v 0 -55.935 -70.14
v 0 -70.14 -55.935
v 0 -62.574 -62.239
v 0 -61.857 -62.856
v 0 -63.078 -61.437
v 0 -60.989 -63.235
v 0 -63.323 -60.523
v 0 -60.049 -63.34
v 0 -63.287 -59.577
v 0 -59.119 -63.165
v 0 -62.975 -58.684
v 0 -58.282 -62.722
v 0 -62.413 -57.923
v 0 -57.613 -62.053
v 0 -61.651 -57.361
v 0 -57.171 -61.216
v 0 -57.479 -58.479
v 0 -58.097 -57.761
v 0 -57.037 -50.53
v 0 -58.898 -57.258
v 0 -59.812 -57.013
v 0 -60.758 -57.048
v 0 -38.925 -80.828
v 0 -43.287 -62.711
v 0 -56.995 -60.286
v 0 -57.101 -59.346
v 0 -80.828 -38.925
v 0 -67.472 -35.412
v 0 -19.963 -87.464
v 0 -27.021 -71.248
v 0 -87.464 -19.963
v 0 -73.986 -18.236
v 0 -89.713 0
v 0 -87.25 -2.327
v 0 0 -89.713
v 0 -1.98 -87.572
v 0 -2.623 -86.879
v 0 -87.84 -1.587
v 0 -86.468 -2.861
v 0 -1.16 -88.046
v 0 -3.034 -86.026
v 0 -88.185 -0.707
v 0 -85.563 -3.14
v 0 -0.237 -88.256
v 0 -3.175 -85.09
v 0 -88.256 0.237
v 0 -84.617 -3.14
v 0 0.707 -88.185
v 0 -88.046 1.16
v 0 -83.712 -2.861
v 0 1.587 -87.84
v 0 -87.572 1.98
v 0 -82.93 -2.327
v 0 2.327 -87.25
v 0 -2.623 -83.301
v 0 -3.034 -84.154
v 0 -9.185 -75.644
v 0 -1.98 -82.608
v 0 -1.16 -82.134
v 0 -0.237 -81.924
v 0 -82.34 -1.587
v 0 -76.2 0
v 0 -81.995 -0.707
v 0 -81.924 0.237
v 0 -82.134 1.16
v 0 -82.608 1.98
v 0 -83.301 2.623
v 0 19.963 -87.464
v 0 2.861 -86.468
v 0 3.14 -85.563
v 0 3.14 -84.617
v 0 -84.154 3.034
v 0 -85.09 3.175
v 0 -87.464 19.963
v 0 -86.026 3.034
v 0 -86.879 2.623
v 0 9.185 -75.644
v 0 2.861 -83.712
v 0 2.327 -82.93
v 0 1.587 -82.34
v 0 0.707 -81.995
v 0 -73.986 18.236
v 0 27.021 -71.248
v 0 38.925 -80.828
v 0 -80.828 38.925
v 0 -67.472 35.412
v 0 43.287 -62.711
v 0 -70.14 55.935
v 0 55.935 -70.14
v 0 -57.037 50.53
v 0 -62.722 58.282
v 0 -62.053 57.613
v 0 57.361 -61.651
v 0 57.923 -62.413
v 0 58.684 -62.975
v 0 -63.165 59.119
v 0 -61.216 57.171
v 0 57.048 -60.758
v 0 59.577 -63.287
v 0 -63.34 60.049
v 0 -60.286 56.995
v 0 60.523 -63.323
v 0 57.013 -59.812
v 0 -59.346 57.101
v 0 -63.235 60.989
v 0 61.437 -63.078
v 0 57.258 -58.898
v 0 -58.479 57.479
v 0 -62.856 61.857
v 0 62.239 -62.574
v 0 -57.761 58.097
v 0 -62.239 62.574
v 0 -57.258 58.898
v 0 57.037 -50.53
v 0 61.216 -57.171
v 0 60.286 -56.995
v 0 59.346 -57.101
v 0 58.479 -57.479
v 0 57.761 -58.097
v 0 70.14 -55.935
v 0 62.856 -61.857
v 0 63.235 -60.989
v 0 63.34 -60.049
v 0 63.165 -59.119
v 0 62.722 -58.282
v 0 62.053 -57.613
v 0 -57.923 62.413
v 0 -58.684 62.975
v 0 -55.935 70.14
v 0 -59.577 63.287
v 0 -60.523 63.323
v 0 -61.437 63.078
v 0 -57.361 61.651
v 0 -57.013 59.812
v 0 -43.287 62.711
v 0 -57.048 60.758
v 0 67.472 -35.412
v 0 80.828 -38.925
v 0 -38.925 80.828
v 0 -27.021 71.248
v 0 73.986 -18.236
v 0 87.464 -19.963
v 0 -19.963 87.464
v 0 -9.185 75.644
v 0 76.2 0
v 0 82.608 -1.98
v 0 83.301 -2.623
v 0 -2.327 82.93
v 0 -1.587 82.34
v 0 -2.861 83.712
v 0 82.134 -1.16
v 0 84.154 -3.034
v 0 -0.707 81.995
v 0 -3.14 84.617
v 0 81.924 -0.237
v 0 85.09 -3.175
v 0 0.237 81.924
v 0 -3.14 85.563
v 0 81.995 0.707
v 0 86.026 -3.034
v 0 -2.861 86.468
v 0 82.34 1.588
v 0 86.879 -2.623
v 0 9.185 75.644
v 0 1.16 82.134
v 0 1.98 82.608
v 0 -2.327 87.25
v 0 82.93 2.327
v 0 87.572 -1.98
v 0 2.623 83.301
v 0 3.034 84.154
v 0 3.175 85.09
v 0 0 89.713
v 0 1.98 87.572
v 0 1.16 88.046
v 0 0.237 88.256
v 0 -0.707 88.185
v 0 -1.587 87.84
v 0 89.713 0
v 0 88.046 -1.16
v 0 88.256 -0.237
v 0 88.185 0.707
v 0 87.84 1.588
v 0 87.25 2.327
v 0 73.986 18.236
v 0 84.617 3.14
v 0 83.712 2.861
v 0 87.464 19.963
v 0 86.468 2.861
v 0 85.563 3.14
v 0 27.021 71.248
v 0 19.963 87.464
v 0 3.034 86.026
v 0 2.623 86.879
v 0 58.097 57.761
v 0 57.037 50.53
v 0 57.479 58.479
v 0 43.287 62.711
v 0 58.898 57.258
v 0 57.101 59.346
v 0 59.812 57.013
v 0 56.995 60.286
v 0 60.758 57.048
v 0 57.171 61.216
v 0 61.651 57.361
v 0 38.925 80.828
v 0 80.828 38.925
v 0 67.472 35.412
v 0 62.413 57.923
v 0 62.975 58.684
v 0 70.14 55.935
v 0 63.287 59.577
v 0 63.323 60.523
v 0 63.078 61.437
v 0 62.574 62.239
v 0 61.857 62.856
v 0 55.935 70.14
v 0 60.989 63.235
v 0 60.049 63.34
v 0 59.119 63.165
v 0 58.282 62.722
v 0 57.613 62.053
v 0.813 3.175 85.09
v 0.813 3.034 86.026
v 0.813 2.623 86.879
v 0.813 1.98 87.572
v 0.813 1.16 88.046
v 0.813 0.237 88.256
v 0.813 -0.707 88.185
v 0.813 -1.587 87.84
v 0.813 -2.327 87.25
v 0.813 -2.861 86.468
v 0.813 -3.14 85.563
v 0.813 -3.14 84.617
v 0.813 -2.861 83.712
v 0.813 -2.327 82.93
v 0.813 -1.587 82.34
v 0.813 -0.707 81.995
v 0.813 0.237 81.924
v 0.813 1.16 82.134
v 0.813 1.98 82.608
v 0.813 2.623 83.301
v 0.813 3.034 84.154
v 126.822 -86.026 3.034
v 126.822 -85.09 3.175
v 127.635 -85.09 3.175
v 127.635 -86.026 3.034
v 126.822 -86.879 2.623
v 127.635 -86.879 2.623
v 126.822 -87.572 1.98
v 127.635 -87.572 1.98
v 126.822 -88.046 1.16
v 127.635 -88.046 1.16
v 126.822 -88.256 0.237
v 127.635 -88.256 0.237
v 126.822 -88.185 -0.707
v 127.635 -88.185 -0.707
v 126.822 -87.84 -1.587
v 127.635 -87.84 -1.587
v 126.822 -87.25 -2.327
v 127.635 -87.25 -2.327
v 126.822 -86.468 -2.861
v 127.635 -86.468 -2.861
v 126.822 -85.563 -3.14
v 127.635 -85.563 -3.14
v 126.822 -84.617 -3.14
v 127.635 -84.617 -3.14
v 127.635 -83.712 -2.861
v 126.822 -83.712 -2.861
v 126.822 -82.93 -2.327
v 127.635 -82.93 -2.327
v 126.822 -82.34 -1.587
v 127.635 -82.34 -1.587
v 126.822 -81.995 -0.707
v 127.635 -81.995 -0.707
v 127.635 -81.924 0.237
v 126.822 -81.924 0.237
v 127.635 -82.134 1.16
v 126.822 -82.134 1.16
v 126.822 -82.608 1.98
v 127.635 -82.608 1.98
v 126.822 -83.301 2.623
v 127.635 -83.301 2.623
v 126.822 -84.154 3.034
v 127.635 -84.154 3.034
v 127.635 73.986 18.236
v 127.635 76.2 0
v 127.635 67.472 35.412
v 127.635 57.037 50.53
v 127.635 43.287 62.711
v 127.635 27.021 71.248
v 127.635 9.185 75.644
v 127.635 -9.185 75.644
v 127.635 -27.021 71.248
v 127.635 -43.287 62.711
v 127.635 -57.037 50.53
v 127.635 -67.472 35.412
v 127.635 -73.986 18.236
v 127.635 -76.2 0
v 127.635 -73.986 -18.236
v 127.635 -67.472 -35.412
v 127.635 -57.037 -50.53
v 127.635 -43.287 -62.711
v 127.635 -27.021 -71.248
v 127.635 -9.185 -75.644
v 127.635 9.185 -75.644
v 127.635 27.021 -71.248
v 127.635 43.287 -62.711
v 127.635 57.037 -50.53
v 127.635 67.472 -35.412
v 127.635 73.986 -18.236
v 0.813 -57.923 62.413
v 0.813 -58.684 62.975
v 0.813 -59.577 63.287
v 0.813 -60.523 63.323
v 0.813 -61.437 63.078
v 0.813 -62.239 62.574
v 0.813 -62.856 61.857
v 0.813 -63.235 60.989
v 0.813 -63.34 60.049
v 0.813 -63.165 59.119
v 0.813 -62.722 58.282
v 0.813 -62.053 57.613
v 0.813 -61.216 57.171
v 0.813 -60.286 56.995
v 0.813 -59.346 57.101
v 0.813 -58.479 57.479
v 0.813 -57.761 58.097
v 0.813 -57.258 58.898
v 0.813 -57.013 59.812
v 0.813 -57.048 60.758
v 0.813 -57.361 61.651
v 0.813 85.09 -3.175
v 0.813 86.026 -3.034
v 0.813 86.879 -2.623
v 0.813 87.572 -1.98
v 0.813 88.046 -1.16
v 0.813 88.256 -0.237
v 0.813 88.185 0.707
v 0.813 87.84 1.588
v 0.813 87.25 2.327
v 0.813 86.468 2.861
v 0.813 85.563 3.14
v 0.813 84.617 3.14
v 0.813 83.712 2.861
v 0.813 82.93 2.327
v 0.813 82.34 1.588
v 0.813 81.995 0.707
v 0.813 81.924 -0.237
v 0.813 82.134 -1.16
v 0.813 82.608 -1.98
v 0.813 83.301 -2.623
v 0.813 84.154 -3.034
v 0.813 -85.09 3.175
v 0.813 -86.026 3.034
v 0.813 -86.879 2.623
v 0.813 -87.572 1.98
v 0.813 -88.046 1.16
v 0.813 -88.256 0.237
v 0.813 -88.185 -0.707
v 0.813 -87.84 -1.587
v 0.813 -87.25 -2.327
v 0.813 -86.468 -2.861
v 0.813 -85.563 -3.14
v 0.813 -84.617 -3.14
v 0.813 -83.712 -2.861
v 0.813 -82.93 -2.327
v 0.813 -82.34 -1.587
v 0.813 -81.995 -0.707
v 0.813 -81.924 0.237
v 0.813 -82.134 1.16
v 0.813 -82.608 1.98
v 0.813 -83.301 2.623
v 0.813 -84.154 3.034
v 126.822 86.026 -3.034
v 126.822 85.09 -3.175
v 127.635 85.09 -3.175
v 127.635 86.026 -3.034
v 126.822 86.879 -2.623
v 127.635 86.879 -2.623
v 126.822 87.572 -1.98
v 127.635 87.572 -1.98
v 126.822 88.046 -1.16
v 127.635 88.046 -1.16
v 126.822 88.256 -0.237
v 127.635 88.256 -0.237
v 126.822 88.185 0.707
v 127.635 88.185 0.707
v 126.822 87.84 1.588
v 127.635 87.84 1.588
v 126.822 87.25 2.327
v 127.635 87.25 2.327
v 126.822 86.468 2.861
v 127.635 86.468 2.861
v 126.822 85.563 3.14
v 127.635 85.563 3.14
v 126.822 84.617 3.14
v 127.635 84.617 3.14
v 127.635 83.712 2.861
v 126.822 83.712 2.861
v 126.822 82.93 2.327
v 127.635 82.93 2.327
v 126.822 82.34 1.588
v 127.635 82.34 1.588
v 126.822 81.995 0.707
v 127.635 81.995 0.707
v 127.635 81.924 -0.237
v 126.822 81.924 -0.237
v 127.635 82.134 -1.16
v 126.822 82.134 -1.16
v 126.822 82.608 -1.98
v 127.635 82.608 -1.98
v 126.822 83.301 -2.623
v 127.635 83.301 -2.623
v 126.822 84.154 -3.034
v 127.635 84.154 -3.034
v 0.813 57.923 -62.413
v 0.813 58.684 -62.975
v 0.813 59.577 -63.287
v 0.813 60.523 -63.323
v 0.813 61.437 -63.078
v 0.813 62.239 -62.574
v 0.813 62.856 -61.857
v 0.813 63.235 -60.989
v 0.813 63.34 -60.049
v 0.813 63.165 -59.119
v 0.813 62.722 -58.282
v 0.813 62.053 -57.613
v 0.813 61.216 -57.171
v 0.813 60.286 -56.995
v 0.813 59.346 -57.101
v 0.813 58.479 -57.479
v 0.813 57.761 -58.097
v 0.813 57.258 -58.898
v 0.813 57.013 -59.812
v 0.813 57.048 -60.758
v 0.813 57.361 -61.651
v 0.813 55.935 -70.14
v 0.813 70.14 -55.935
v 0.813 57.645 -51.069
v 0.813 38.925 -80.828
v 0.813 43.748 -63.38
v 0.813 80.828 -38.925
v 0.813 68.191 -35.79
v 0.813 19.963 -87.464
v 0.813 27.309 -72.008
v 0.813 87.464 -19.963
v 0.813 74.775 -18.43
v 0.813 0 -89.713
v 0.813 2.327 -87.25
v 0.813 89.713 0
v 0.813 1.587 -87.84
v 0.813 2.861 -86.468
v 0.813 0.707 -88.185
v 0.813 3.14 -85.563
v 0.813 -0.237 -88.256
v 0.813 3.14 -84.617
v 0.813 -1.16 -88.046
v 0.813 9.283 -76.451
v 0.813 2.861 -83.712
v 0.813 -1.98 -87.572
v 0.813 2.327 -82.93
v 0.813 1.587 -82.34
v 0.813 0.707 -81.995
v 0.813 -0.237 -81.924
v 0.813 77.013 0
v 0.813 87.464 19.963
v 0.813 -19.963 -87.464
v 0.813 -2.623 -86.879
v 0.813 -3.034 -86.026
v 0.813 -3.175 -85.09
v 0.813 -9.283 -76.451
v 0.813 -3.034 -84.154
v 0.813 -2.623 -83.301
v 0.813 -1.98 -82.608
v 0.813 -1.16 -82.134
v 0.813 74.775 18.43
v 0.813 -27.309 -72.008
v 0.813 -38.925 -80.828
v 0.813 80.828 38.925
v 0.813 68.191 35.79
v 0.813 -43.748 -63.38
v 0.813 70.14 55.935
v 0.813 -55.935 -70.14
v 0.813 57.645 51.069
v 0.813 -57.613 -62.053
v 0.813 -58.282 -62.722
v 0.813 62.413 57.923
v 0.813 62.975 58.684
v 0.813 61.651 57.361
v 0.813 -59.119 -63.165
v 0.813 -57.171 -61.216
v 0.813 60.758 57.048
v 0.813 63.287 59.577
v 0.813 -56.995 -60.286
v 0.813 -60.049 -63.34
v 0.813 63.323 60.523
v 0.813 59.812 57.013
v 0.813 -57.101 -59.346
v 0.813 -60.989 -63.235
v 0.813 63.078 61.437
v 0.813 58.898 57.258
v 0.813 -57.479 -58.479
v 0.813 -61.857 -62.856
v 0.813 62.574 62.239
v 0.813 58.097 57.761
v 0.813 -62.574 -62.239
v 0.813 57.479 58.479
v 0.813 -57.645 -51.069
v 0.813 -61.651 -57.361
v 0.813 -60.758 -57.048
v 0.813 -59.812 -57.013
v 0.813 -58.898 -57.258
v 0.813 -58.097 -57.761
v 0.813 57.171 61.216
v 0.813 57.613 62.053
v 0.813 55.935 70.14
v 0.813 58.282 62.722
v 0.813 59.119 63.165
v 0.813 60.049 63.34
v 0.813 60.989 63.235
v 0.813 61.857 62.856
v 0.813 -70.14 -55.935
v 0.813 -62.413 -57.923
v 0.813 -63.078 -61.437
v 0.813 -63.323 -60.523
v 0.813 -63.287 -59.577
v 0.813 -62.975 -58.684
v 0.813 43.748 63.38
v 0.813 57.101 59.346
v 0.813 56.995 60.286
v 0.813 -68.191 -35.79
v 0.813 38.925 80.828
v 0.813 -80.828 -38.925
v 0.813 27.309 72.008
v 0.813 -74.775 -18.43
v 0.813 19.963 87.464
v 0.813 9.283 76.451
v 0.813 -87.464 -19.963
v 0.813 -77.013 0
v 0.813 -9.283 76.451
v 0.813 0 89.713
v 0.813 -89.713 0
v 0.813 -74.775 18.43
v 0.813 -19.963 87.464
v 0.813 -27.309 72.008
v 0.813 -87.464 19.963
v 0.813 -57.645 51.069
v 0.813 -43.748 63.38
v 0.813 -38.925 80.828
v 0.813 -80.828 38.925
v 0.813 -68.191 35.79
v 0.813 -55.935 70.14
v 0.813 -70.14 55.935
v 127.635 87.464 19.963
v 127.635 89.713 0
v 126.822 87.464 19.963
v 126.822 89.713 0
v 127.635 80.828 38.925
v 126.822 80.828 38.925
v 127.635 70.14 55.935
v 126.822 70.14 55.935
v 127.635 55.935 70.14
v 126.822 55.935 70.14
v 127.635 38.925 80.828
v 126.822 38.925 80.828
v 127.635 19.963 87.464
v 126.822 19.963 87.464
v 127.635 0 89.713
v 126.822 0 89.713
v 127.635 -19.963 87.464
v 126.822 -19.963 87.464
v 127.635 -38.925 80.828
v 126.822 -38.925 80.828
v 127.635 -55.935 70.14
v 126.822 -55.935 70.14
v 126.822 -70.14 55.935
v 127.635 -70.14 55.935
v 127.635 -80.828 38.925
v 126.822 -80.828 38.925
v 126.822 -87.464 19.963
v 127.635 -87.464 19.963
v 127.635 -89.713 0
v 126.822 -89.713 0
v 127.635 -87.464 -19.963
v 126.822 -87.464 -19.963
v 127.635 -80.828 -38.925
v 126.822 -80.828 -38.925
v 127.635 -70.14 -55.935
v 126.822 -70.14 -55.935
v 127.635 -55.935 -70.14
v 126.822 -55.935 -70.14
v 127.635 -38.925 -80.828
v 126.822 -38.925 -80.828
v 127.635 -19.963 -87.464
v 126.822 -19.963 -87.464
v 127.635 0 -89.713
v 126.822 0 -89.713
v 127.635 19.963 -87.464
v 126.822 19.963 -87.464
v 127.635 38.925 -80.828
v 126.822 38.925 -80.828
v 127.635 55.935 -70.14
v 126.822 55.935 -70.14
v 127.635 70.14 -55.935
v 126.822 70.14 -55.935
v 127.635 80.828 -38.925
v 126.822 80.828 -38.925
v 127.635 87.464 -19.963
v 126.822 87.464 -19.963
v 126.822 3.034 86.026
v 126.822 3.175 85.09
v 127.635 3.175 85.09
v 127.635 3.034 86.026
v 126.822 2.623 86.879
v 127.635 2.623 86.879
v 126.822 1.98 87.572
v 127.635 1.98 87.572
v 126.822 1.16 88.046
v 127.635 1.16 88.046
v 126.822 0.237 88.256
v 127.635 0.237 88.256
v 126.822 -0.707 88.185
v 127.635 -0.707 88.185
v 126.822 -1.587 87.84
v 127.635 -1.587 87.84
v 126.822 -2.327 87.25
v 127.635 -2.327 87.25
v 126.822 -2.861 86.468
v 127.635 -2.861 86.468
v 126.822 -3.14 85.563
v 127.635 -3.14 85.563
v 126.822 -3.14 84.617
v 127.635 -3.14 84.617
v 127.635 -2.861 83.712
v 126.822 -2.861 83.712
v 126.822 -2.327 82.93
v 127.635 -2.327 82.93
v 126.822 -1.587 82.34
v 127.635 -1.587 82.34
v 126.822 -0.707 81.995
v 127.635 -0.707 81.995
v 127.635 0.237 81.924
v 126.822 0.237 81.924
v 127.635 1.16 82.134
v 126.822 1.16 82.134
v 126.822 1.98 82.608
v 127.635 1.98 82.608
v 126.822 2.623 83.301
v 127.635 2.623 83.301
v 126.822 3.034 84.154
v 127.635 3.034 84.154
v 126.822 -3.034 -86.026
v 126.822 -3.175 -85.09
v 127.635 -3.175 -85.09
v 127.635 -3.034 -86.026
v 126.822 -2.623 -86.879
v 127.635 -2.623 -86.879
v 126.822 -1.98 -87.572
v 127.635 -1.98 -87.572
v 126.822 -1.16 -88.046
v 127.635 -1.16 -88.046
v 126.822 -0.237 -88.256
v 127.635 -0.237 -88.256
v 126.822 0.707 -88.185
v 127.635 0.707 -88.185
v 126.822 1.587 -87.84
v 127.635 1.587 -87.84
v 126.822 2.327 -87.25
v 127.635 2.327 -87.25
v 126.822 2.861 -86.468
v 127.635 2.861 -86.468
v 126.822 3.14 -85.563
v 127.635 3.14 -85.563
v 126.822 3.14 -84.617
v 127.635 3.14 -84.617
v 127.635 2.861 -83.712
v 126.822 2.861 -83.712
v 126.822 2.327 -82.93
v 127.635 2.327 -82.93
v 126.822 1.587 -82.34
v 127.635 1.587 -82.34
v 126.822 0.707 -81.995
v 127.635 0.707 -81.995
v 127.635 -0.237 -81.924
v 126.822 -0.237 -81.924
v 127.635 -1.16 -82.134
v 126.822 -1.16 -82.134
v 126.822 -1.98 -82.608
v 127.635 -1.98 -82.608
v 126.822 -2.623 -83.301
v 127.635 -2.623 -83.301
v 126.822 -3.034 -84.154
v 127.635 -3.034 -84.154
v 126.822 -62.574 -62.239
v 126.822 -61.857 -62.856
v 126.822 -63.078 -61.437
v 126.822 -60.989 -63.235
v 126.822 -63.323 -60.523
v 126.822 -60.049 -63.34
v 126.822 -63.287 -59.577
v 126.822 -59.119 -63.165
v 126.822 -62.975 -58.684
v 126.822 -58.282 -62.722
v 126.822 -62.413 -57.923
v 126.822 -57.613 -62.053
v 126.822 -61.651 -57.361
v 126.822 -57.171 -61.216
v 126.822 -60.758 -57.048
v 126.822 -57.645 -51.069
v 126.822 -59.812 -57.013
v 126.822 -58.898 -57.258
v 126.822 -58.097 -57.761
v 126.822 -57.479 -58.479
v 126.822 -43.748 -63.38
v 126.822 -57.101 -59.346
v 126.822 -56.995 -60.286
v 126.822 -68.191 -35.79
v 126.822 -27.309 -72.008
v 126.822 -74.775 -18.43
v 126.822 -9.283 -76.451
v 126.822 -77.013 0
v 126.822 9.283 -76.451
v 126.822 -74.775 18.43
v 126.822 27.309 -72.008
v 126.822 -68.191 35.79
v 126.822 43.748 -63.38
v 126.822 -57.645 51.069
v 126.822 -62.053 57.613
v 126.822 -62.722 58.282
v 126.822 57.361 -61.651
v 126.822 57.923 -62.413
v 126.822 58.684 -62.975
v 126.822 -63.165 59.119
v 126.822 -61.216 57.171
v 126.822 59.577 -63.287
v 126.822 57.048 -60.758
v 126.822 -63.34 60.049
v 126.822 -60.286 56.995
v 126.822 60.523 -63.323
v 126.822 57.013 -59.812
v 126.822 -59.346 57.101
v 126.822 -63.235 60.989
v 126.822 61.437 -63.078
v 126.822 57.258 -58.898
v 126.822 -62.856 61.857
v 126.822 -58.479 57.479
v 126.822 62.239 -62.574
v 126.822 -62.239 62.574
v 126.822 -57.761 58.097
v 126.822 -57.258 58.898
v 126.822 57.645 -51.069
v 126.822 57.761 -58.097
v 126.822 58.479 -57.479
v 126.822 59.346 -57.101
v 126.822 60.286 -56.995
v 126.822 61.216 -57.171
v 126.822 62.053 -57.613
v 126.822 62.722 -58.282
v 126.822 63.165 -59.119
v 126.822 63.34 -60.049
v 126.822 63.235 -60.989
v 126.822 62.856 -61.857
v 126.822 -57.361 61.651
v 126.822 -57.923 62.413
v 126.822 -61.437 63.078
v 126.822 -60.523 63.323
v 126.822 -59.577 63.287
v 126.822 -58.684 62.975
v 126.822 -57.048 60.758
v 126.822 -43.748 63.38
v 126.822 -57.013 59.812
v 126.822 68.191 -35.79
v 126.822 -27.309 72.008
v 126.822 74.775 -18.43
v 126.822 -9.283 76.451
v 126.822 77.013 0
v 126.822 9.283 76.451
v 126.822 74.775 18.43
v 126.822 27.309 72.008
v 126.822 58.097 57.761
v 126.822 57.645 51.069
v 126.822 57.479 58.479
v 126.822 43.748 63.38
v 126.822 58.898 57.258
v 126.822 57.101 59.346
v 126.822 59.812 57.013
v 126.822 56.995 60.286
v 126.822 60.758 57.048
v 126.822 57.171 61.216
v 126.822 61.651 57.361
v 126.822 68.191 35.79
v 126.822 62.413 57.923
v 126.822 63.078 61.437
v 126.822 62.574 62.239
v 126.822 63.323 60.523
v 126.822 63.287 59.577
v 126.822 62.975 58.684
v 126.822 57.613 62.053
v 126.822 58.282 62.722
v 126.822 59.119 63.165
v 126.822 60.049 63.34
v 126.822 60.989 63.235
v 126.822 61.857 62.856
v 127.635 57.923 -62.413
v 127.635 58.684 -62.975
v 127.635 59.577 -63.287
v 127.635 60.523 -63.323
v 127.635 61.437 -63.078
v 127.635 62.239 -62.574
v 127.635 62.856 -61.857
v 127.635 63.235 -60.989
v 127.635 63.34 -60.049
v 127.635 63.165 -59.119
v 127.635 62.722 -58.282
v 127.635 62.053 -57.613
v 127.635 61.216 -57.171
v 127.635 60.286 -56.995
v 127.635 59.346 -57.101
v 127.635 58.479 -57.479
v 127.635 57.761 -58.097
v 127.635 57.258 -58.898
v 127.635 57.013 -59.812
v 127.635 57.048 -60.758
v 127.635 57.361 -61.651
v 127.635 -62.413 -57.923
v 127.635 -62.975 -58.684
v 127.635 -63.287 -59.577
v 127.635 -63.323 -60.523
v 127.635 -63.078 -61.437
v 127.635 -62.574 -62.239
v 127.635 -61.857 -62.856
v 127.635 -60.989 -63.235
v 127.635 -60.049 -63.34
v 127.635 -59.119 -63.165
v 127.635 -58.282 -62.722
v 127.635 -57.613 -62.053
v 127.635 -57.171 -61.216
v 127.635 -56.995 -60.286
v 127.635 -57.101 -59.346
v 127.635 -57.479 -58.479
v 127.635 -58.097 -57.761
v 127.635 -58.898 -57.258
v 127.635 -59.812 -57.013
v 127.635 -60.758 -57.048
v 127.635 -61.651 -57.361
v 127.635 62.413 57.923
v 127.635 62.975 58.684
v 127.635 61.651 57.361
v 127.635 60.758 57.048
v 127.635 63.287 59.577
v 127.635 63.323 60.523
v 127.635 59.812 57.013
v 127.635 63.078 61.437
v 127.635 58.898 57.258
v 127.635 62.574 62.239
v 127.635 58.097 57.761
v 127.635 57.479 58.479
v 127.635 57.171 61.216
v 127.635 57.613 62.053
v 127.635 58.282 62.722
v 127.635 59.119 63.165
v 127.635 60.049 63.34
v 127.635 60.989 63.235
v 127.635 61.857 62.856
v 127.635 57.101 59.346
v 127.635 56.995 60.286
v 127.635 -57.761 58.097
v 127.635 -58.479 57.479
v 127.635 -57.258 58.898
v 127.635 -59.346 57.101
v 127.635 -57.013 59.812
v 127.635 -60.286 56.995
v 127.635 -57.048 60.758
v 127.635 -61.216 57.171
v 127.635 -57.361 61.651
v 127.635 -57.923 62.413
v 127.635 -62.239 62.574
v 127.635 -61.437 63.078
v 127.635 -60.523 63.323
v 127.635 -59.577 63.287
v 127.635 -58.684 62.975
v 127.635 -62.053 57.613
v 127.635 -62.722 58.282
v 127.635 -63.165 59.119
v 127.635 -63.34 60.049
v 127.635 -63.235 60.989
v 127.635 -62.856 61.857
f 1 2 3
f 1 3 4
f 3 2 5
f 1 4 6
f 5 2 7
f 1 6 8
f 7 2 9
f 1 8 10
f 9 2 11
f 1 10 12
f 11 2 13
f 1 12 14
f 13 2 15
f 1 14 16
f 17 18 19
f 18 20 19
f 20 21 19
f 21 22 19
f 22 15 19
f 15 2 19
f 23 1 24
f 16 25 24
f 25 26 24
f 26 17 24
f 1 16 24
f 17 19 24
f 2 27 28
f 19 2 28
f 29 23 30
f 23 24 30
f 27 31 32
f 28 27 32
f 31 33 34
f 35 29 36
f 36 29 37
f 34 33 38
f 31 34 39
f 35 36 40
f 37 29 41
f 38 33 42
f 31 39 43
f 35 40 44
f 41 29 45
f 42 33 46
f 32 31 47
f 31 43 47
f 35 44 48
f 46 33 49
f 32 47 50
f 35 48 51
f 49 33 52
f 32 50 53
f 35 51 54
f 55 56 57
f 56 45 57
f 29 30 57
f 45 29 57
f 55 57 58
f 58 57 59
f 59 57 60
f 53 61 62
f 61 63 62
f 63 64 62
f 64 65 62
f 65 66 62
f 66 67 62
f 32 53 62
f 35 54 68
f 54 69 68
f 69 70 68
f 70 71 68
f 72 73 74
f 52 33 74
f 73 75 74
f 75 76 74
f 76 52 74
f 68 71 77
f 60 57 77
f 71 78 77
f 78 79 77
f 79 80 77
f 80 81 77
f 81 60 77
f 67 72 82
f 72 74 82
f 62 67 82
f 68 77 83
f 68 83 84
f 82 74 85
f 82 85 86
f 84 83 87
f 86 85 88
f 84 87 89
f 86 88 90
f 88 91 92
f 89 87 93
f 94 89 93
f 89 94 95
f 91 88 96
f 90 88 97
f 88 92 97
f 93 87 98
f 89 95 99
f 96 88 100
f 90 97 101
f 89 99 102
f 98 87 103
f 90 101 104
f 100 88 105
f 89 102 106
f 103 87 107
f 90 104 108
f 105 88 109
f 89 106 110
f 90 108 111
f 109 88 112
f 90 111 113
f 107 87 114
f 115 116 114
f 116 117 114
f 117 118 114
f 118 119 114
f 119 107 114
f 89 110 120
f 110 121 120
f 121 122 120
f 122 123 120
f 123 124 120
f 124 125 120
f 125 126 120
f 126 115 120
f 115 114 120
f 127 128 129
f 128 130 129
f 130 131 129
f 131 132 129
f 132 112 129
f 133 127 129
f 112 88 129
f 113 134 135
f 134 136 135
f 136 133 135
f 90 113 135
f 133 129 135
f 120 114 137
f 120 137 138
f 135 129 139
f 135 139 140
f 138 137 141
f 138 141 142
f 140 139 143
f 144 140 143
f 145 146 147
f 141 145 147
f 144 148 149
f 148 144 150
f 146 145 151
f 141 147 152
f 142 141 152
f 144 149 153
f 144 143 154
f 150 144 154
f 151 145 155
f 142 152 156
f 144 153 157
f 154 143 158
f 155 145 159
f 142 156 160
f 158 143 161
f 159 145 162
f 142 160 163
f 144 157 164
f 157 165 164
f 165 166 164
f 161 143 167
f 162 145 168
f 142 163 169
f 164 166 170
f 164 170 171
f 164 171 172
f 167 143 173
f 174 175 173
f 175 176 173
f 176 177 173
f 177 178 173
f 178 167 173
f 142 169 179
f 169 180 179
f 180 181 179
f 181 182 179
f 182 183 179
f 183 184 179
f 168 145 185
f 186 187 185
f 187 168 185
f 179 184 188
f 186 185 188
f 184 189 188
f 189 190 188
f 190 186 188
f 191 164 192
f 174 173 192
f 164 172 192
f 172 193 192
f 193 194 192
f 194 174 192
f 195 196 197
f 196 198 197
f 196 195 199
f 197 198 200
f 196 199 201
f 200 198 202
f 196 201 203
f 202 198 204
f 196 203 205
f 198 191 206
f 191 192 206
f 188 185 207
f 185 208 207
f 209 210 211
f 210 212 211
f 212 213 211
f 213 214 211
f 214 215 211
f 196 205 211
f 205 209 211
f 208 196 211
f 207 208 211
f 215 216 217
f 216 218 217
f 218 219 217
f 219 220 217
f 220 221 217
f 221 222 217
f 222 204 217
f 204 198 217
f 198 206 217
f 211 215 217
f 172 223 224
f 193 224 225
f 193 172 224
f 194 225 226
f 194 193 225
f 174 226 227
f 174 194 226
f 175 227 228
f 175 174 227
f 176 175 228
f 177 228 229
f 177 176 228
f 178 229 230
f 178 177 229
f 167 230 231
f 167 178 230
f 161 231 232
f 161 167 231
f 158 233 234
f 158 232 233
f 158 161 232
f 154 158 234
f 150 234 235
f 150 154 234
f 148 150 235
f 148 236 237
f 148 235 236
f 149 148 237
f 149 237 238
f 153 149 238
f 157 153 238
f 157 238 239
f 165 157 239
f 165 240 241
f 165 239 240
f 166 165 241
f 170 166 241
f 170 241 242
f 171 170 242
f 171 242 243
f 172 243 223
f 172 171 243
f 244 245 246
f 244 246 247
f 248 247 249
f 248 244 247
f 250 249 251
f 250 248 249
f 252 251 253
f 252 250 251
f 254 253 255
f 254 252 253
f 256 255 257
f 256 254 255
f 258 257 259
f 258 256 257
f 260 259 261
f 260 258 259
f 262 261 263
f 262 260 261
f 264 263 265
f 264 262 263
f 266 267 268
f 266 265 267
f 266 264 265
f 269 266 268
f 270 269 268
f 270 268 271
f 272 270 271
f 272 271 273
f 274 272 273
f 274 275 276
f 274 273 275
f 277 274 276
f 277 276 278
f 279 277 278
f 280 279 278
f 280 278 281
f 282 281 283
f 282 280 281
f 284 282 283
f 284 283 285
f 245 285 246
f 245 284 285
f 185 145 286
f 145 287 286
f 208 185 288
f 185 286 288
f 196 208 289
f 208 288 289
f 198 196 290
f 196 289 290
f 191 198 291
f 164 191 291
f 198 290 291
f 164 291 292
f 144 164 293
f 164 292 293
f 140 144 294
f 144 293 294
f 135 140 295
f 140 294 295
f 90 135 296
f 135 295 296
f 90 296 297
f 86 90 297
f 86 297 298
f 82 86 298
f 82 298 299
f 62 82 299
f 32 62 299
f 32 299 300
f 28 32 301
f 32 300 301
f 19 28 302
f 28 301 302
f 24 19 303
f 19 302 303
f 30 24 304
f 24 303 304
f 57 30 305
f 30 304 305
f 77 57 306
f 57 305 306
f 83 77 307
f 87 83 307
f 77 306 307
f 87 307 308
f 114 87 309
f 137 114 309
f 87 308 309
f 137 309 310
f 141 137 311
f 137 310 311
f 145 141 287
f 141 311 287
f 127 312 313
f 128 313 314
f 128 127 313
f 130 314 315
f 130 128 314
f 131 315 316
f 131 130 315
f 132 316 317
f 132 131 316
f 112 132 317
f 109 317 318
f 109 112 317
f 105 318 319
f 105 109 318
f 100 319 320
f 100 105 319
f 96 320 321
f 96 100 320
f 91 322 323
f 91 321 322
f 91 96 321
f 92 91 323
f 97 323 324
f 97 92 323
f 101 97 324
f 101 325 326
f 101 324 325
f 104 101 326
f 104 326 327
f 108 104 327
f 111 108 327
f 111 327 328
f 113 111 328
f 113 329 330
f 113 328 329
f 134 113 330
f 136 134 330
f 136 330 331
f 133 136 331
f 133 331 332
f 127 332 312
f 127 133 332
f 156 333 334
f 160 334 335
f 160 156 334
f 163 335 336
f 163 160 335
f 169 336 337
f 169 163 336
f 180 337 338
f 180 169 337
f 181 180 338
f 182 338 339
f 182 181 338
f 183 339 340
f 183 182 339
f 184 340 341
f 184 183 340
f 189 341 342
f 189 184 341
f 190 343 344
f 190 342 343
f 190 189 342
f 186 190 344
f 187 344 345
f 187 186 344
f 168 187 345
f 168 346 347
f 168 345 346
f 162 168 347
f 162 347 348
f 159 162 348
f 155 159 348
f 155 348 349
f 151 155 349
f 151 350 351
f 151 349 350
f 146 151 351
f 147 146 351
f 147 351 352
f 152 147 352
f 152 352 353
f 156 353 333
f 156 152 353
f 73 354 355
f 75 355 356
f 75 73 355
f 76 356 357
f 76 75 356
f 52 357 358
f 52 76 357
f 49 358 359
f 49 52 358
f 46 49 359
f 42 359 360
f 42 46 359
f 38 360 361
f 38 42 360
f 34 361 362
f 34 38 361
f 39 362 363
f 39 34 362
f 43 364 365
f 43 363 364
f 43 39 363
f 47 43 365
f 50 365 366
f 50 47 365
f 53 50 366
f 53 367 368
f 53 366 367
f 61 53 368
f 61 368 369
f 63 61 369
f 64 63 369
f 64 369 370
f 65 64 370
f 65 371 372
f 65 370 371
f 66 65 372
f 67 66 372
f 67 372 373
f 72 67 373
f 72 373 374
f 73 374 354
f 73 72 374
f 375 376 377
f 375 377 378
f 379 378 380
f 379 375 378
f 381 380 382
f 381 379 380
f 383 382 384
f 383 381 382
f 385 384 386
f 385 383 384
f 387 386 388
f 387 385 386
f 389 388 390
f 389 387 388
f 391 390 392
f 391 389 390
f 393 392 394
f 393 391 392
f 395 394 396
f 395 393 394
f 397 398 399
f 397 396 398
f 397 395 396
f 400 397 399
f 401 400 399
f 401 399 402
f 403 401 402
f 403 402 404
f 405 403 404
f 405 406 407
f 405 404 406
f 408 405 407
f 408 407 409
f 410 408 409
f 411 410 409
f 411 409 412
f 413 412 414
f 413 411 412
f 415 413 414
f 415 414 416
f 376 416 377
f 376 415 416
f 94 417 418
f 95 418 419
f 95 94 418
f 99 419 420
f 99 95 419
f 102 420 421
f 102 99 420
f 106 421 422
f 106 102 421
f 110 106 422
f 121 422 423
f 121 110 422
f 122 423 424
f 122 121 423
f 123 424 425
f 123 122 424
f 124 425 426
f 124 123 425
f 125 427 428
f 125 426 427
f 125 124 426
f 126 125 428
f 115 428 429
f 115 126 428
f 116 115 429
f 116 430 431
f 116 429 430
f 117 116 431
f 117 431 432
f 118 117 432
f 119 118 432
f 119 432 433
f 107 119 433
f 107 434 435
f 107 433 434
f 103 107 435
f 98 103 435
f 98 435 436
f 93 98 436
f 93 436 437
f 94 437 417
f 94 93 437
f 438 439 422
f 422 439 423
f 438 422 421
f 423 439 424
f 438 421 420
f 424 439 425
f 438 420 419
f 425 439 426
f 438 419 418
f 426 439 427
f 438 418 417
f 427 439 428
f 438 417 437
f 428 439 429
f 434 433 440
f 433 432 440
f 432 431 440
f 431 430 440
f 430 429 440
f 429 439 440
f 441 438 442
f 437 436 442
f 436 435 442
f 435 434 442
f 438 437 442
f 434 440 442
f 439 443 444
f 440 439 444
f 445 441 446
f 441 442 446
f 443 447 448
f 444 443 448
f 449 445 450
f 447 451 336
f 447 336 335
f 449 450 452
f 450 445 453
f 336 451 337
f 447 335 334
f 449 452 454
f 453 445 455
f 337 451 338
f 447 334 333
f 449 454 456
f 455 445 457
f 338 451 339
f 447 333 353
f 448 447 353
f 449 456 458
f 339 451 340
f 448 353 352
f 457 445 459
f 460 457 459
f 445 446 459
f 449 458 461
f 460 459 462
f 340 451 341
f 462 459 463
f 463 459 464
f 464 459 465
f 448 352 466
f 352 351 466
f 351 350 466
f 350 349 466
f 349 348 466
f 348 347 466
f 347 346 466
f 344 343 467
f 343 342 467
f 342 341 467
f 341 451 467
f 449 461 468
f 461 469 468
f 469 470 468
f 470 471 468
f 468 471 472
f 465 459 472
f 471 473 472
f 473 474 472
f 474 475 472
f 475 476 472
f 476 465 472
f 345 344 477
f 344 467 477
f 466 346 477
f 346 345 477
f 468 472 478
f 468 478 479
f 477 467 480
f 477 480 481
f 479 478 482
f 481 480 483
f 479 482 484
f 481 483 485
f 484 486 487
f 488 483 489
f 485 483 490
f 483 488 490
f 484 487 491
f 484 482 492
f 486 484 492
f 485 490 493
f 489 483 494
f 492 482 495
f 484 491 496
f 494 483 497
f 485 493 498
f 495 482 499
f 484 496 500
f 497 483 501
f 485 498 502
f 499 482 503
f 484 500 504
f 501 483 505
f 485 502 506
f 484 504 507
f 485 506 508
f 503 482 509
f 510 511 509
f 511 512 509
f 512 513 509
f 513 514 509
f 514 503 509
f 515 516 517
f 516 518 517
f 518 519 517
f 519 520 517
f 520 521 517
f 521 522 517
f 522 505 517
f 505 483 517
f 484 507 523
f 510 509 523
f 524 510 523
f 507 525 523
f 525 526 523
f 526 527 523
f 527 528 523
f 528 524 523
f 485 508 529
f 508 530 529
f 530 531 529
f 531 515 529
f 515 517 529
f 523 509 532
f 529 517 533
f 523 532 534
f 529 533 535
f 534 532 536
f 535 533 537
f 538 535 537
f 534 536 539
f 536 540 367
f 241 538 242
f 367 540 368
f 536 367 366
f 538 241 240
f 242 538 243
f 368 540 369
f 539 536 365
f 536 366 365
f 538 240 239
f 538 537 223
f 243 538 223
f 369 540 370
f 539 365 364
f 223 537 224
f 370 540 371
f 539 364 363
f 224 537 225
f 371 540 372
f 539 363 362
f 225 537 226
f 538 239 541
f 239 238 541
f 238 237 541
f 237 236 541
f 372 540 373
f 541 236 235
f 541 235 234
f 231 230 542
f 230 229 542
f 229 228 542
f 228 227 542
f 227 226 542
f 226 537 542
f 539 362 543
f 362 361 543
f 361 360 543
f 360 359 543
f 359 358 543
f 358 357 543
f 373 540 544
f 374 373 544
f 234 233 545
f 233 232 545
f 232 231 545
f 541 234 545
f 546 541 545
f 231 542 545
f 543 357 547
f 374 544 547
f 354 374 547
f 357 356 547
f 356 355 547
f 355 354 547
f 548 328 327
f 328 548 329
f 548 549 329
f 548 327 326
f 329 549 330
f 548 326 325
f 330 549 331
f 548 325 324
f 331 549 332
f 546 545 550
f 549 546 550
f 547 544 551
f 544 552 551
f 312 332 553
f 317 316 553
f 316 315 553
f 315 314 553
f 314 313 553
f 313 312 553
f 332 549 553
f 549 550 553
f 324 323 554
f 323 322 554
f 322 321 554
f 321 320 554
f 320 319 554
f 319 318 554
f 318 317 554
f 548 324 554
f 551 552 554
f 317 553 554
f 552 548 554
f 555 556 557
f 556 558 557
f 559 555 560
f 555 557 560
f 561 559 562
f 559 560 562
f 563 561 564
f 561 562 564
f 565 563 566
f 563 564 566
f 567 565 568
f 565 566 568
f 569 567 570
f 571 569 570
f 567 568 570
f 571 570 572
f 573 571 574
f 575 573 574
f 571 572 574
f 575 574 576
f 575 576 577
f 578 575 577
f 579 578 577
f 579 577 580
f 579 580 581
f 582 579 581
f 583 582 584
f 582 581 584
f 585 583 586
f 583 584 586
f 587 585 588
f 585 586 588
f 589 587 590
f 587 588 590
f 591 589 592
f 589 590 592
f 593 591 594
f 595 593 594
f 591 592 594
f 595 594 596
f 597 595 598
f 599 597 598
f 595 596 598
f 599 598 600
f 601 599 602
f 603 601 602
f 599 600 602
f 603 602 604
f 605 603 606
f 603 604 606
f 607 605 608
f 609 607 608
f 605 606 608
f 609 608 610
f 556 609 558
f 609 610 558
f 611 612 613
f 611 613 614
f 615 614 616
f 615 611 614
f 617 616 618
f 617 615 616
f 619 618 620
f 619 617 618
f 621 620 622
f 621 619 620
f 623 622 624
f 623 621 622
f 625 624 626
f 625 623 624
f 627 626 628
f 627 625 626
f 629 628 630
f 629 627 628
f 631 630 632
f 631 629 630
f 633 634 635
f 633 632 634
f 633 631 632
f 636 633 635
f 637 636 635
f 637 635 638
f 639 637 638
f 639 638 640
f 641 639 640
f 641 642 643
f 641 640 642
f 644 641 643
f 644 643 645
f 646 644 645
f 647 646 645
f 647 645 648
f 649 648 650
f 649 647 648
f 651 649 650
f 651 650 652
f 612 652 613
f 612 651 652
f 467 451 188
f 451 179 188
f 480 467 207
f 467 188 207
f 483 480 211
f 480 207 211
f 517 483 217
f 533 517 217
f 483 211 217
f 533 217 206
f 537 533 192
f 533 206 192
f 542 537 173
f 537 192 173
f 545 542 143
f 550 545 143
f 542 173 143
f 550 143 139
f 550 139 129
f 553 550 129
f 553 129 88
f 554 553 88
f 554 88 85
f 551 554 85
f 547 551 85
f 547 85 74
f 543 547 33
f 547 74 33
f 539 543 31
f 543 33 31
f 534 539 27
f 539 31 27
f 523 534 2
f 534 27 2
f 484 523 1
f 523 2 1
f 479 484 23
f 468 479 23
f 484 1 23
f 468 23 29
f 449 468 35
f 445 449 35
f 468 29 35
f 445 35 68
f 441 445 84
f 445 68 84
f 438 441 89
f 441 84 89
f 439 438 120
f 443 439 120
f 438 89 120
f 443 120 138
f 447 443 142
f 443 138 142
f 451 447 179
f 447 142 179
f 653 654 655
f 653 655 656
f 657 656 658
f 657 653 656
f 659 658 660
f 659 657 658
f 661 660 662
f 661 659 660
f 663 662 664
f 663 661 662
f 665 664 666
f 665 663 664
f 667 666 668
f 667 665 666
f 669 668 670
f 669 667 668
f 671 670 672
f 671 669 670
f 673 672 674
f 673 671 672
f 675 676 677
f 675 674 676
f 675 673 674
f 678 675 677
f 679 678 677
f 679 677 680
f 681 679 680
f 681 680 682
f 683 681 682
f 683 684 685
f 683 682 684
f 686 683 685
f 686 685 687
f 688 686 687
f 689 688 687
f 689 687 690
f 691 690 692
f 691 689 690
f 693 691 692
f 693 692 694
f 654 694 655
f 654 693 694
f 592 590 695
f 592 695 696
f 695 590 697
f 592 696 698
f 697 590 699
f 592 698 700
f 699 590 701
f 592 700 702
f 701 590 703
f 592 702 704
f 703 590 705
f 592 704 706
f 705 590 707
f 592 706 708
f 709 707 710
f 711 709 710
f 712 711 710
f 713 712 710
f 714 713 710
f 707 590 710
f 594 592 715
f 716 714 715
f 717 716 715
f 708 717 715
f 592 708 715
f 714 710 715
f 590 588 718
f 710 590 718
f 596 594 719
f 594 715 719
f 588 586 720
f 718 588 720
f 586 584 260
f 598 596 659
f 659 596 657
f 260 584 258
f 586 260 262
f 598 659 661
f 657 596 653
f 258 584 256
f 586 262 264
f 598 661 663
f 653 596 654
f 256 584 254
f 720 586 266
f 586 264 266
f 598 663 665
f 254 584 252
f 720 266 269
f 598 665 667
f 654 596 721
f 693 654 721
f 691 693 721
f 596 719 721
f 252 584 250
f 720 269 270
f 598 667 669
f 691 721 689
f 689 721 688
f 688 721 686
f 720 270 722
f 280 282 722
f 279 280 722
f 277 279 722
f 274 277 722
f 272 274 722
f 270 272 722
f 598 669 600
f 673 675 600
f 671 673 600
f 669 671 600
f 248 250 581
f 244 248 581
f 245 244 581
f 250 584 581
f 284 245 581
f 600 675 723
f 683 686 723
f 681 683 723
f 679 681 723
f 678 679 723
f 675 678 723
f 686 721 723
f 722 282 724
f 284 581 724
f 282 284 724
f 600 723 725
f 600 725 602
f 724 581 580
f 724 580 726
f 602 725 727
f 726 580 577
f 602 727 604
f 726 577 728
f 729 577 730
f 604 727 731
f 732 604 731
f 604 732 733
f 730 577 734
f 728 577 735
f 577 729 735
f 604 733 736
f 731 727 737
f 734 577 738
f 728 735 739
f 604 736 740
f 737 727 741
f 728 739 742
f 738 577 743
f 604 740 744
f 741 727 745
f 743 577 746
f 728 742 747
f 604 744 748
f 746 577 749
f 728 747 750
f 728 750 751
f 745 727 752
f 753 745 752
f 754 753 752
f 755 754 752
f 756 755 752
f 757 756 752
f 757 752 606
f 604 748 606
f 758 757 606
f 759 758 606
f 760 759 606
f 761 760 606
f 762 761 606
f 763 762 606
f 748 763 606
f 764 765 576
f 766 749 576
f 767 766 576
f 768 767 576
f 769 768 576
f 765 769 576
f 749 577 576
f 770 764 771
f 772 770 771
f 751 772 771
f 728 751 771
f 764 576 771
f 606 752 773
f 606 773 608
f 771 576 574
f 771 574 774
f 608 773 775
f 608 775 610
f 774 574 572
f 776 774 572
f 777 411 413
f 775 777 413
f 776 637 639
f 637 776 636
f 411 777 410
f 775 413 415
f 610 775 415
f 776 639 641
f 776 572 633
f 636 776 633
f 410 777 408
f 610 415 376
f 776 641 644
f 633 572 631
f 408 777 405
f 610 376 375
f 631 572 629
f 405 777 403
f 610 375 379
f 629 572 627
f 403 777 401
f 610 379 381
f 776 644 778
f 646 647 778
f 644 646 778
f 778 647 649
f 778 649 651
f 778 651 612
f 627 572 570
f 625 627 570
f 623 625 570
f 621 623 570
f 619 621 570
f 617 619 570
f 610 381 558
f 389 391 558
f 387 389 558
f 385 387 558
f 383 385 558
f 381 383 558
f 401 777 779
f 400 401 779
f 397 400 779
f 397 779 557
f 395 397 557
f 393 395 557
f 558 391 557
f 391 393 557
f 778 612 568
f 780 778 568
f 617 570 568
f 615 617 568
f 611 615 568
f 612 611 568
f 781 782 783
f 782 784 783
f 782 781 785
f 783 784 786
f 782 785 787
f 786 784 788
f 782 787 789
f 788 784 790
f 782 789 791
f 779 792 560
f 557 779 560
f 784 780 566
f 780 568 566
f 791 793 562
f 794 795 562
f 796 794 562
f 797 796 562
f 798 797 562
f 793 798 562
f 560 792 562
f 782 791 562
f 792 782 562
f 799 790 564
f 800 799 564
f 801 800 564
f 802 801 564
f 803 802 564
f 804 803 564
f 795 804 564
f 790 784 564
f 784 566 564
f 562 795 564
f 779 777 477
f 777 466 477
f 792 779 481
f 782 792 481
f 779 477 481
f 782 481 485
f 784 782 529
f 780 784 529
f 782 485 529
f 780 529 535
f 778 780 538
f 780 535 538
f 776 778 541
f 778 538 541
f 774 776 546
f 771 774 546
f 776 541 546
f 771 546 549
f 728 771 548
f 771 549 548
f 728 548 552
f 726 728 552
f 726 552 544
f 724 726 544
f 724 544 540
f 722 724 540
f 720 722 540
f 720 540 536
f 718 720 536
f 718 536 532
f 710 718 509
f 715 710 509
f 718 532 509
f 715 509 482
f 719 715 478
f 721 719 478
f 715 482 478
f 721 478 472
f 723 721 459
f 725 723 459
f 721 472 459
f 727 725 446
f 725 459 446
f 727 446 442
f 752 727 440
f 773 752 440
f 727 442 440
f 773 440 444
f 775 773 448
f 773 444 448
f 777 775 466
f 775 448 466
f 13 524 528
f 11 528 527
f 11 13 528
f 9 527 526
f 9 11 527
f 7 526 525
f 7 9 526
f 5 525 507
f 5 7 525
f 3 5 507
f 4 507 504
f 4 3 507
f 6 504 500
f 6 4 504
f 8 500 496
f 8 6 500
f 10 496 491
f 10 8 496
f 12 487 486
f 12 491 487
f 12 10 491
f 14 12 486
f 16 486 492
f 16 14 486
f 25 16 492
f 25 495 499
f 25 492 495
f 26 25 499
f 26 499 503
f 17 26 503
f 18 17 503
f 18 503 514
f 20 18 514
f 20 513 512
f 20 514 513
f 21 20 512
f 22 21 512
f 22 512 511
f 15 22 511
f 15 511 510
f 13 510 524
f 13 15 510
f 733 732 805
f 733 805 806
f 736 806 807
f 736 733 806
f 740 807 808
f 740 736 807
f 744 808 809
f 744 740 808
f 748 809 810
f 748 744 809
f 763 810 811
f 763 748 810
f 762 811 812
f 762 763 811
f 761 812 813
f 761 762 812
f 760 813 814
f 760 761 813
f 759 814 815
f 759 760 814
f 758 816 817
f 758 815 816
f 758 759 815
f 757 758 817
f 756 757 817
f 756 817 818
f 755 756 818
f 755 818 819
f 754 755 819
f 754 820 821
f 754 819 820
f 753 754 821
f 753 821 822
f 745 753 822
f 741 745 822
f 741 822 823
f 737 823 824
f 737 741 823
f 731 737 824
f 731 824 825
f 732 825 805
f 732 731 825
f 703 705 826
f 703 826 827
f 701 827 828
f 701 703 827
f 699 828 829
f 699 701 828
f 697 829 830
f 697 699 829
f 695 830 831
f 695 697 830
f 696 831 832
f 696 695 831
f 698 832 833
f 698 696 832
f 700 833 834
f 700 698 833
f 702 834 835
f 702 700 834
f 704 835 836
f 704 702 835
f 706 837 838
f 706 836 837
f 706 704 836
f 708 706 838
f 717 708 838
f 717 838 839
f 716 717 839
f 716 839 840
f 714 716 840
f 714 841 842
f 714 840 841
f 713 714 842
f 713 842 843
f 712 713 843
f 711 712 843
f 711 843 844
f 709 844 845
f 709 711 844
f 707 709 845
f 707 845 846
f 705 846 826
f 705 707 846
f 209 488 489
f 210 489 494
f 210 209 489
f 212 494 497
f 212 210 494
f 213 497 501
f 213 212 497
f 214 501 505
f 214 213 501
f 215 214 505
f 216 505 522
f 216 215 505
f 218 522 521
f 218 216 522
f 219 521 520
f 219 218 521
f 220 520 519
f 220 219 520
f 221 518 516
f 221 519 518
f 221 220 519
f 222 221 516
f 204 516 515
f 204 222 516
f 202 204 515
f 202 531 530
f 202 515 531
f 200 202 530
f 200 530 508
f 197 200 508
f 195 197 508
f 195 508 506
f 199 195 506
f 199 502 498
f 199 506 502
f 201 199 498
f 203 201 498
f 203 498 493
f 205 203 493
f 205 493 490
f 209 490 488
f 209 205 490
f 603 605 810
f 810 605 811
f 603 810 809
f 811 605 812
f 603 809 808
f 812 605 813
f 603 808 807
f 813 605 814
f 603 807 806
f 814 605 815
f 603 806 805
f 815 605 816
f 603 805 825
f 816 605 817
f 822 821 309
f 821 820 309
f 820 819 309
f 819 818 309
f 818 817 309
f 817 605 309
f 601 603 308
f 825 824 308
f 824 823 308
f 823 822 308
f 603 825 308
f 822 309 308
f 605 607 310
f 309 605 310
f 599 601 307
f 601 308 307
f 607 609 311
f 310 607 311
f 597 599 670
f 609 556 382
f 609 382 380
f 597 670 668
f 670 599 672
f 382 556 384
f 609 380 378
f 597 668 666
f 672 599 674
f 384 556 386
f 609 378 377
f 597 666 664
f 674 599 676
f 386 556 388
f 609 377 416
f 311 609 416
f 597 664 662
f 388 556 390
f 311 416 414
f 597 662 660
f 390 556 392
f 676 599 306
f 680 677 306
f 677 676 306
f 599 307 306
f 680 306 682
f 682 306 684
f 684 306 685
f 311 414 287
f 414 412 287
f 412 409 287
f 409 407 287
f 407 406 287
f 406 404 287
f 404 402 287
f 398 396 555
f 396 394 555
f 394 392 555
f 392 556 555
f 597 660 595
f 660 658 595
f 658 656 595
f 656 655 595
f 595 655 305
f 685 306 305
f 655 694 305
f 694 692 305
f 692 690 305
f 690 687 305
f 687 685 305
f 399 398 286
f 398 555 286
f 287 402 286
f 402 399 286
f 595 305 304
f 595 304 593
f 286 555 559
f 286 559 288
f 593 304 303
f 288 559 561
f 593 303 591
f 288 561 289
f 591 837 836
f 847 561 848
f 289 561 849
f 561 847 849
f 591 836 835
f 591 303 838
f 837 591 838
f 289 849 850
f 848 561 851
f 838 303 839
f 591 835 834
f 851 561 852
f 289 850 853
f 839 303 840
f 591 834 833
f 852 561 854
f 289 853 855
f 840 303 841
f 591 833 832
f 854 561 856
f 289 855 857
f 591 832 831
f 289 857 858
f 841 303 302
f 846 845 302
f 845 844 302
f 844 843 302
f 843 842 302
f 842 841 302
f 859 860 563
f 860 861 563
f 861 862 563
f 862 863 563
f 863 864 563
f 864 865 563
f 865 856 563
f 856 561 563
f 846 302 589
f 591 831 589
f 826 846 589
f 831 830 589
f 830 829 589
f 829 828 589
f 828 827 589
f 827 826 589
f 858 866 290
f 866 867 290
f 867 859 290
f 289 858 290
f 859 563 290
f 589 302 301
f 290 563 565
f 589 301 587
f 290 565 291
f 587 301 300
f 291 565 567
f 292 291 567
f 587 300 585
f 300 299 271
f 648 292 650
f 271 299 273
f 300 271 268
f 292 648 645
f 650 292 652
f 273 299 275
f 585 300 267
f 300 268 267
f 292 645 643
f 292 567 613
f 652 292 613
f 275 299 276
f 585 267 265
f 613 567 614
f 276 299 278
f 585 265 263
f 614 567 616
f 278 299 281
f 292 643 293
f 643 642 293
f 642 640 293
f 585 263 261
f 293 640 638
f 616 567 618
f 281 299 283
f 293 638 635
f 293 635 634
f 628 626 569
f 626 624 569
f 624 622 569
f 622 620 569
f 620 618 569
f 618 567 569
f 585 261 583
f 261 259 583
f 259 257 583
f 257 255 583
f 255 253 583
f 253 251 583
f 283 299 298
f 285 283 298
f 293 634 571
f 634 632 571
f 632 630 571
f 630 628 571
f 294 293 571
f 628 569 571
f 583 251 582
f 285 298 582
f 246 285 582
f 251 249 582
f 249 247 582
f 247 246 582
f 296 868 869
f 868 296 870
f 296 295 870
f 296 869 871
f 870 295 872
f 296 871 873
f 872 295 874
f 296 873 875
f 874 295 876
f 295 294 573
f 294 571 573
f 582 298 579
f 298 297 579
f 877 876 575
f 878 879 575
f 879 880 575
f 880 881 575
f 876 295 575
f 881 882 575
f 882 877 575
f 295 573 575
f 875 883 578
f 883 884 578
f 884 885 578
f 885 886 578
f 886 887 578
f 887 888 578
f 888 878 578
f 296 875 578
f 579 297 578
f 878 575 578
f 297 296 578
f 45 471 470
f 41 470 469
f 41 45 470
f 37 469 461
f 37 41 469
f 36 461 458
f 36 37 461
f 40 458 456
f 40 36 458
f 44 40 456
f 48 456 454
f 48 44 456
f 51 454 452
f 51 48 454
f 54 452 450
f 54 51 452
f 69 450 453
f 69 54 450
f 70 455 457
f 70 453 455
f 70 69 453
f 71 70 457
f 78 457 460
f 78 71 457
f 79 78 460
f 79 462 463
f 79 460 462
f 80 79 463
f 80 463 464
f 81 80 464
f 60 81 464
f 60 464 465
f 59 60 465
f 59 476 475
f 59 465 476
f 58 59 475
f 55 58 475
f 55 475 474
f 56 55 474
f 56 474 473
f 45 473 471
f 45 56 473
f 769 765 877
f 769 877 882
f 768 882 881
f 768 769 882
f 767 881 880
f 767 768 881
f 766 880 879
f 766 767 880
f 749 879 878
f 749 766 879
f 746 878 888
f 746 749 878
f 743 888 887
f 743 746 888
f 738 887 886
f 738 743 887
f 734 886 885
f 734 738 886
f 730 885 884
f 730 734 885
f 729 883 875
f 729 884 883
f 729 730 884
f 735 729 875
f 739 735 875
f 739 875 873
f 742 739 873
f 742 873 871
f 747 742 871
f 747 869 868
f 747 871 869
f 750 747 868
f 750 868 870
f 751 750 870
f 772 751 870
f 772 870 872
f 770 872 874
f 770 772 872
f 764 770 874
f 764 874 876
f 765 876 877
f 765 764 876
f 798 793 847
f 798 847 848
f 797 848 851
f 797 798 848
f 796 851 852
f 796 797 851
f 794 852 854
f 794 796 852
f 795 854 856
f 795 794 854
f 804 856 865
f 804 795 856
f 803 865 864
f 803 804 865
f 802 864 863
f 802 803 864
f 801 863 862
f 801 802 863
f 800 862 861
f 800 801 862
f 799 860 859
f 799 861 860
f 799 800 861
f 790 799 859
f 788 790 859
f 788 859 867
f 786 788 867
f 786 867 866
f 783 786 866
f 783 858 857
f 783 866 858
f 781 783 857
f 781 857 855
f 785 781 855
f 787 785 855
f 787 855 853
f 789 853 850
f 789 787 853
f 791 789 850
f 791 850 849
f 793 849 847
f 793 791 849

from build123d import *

# Parameters (mm, degrees)
SKETCH2_R          = 3.175
CUT_EXTRUDE1_DEPTH = 224.79
CIRPATTERN1_COUNT  = 8


with BuildPart() as part:
    # Sketch1 → Revolve1 (revolve)
    with BuildSketch(Plane.XY):
        Polygon((0, 76.2), (127.635, 76.2), (127.635, 89.7128), (126.8222, 89.7128), (126.8222, 77.0128), (0.8128, 77.0128), (0.8128, 89.7128), (0, 89.7128), align=None)
    revolve(axis=Axis((0, 0, 0), (1, 0, 0)))

    # Sketch2 → Cut-Extrude1 (cut)
    with BuildSketch(Plane(origin=(0, 0, 0), x_dir=(0, 0, -1), z_dir=(1, 0, 0))):
        with Locations((0, 85.09)):
            Circle(SKETCH2_R)
    cut_extrude1 = extrude(amount=CUT_EXTRUDE1_DEPTH, mode=Mode.SUBTRACT)

    # CirPattern1: Cut-Extrude1 ×8 about axis
    cirpattern1_axis = Axis((0, 0, 0), (1, 0, 0))
    for i in range(1, CIRPATTERN1_COUNT):
        add(cut_extrude1.rotate(cirpattern1_axis, i * 360 / CIRPATTERN1_COUNT), mode=Mode.SUBTRACT)


solid = part.part
